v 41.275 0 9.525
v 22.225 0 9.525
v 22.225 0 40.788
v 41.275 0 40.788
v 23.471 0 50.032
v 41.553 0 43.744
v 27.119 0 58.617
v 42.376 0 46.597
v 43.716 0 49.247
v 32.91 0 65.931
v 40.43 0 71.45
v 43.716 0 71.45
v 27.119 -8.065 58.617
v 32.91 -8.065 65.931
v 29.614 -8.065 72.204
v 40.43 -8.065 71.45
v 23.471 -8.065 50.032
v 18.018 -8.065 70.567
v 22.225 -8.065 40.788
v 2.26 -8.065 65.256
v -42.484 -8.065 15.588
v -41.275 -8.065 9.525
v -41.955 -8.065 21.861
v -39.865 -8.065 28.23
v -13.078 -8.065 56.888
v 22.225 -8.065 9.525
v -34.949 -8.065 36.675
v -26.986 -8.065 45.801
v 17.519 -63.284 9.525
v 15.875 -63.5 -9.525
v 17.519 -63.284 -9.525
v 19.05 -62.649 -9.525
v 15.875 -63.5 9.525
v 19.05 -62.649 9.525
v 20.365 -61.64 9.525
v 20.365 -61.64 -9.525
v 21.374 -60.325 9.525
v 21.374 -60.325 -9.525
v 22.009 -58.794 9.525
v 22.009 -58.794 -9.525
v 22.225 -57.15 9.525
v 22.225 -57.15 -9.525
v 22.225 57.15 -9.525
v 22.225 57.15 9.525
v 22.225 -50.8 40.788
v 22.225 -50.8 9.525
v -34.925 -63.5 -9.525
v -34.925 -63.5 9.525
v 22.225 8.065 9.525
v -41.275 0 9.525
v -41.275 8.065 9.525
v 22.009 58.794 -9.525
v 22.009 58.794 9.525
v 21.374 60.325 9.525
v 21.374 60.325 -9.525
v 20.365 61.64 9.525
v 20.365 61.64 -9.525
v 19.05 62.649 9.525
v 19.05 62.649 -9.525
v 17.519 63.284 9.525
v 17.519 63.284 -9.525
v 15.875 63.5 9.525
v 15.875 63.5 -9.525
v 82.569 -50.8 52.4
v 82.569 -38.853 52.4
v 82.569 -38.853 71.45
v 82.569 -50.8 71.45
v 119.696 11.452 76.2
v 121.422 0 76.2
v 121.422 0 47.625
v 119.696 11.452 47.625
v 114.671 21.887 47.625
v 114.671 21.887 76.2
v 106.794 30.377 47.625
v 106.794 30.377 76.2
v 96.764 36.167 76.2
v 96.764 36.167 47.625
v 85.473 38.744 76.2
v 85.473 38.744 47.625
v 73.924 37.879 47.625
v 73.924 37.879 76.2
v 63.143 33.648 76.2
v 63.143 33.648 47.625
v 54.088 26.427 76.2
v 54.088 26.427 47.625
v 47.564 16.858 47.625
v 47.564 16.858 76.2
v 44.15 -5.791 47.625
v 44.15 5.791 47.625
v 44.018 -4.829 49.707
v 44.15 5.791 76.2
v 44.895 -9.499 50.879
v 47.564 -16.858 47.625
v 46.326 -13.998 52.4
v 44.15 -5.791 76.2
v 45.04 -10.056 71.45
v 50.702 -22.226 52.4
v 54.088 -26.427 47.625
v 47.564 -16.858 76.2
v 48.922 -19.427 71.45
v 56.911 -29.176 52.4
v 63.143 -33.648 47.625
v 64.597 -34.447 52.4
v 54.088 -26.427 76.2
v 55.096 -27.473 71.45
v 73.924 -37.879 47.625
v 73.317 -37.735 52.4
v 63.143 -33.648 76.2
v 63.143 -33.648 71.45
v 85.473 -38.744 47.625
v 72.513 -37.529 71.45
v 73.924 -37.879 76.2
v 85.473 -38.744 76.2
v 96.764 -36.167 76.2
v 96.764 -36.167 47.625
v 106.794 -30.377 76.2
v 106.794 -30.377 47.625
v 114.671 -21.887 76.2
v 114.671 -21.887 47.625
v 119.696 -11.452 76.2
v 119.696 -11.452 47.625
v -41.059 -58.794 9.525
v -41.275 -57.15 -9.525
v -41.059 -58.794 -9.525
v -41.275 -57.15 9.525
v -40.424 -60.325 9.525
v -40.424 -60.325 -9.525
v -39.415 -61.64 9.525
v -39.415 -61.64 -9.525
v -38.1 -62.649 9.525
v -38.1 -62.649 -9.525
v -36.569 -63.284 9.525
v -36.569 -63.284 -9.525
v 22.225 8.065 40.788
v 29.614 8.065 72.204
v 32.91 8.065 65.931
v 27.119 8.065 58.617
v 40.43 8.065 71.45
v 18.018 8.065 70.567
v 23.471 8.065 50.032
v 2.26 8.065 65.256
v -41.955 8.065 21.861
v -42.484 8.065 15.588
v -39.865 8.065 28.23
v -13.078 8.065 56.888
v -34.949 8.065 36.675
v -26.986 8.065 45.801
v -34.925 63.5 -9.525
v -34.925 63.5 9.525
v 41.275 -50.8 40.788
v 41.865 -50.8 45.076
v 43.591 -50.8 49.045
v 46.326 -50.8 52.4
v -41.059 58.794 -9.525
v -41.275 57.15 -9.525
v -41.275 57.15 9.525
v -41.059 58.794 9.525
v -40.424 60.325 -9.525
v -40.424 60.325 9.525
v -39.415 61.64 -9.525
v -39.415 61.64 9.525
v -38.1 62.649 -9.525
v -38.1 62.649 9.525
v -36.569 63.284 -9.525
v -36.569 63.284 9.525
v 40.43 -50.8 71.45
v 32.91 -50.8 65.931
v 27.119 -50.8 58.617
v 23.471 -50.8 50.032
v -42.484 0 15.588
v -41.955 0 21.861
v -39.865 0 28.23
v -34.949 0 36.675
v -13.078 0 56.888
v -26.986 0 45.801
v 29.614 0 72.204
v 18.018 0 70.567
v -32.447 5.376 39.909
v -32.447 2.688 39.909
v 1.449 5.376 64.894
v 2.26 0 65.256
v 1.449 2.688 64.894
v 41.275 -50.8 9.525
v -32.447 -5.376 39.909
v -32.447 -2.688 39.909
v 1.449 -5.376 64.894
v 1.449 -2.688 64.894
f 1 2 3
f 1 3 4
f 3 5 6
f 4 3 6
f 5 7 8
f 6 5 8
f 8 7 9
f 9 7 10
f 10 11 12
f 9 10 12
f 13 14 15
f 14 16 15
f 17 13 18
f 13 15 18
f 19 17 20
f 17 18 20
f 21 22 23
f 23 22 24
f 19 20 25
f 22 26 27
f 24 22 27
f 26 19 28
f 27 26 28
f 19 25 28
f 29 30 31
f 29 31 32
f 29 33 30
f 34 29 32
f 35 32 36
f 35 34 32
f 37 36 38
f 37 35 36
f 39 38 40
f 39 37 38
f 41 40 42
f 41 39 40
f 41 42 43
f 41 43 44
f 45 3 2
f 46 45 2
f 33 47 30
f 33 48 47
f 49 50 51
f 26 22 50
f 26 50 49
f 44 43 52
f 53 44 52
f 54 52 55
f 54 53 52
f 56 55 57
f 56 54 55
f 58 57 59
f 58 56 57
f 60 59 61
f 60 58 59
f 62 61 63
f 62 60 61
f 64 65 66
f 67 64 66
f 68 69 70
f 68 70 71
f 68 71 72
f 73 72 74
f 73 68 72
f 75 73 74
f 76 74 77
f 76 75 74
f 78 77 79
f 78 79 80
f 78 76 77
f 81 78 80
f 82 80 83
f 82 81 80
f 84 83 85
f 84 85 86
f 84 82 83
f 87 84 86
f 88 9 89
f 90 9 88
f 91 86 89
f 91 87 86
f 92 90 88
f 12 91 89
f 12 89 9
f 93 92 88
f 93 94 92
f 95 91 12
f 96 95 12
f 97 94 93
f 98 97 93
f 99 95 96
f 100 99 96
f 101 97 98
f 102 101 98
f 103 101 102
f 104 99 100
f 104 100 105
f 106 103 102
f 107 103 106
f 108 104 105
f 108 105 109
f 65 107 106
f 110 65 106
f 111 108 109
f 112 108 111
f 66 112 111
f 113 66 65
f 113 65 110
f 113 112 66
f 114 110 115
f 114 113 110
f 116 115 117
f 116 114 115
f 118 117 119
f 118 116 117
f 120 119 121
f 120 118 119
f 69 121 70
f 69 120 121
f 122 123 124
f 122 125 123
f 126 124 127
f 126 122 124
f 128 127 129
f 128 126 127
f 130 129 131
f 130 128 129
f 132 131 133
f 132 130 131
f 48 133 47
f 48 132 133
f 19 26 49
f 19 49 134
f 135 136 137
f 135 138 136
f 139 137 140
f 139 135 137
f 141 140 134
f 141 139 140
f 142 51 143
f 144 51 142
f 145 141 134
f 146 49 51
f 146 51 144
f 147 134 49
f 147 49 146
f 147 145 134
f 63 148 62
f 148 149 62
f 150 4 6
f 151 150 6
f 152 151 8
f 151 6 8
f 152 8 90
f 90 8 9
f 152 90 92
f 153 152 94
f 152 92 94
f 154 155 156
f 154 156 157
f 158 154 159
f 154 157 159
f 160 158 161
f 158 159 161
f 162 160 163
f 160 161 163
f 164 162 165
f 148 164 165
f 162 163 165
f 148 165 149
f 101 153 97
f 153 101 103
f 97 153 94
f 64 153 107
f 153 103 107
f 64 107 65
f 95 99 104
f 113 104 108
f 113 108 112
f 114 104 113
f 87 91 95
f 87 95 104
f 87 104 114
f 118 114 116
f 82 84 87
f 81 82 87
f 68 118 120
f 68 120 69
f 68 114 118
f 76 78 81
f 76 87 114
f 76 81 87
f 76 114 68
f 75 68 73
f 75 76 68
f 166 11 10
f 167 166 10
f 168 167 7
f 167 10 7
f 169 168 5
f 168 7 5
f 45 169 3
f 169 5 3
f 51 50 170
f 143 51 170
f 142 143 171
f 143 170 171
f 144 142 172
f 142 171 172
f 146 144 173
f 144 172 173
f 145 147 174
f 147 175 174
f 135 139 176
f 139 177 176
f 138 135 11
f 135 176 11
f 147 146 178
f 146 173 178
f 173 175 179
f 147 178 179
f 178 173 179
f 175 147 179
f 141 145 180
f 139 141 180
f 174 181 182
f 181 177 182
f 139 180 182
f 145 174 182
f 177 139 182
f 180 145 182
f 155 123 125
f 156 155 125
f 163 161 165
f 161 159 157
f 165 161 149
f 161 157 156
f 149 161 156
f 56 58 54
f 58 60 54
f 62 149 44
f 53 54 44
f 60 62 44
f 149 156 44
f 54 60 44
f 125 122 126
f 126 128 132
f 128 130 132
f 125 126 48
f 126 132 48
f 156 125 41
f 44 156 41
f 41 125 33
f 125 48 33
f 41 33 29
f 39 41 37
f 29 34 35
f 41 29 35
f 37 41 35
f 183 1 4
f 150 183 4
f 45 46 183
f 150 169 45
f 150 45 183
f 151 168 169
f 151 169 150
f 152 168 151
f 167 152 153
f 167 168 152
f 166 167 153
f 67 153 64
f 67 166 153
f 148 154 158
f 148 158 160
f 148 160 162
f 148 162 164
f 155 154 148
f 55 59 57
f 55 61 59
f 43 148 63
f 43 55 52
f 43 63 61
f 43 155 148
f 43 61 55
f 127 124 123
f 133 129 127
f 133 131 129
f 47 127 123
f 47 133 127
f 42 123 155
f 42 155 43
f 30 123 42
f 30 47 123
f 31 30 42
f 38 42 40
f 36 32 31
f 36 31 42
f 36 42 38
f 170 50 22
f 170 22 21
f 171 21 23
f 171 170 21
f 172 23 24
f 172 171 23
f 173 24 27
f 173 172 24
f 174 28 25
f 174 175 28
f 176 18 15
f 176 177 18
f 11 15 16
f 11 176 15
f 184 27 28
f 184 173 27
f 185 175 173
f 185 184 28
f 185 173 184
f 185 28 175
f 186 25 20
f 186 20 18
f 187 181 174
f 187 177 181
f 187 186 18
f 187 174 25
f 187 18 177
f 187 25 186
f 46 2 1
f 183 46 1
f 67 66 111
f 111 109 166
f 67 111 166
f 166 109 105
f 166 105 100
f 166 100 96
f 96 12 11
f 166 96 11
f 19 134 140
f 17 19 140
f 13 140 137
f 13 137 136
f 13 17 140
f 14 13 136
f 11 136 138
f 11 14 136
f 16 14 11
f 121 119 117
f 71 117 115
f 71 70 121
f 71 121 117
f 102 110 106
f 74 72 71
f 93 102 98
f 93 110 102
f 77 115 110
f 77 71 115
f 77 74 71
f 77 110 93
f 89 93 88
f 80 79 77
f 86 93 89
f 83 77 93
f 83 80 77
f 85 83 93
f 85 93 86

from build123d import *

# Parameters (mm, degrees)
F0_W     = 63.5
F0_H     = 19.05
F1_DEPTH = 63.5
F0_W_2   = 11.946930586
F2_DEPTH = 50.8
F3_DEPTH = 8.0645
F5_R     = 6.35


with BuildPart() as f1:
    # F0 (on Front) → F1 (new body, symmetric)
    with BuildSketch(Plane.XZ):
        with Locations((-9.525, 0)):
            Rectangle(F0_W, F0_H)
    extrude(amount=F1_DEPTH, both=True)

    # F5
    f5_edges = [f1.edges().sort_by_distance(p)[0] for p in [
        (22.225, -63.5, 0),
        (-41.275, -63.5, 0),
        (-41.275, 63.5, 0),
        (22.225, 63.5, 0),
    ]]
    fillet(f5_edges, radius=F5_R)


with BuildPart() as f2:
    # F0 (on Front) → F2 (new body)
    with BuildSketch(Plane.XZ):
        with BuildLine():
            Line((22.225, 40.787809422), (22.225, 9.525))
            Line((22.225, 9.525), (41.275, 9.525))
            Line((41.275, 9.525), (41.275, 40.787809422))
            ThreePointArc((41.275, 40.787809422), (42.5923001513, 47.1193969098), (46.3255826917, 52.4002))
            Line((46.3255826917, 52.4002), (70.6224152459, 52.4002))
            Line((70.6224152459, 52.4002), (70.6224152459, 71.4502))
            Line((70.6224152459, 71.4502), (40.4295505729, 71.4502))
            ThreePointArc((40.4295505729, 71.4502), (27.1190383001, 58.6174747128), (22.225, 40.787809422))
        make_face()
        with Locations((76.5958805389, 61.9252)):
            Rectangle(F0_W_2, F0_H)
    extrude(amount=F2_DEPTH)

    # F0 (on Front) → F4 (revolve)
    with BuildSketch(Plane.XZ):
        Polygon((82.5693458319, 76.2), (82.5693458319, 71.4502), (82.5693458319, 52.4002), (82.5693458319, 47.625), (121.4224152459, 47.625), (121.4224152459, 76.2), align=None)
    revolve(axis=Axis((82.5693458319, 0, 61.9125), (0, 0, 1)))


with BuildPart() as f3:
    # F0 (on Front) → F3 (new body, symmetric)
    with BuildSketch(Plane.XZ):
        with BuildLine():
            add(Edge.make_bspline(
                [(-41.275, 9.525), (-51.6410161004, 38.2644806741), (5.5672849006, 78.4525085923), (40.4295505729, 71.4502)],
                knots=[0, 0, 0, 0, 102.5200662278, 102.5200662278, 102.5200662278, 102.5200662278], degree=3))
            Line((-41.275, 9.525), (22.225, 9.525))
            Line((22.225, 9.525), (22.225, 40.787809422))
            ThreePointArc((22.225, 40.787809422), (27.1190383001, 58.6174747128), (40.4295505729, 71.4502))
        make_face()
    extrude(amount=F3_DEPTH, both=True)


solid = Compound([f1.part, f2.part, f3.part])
